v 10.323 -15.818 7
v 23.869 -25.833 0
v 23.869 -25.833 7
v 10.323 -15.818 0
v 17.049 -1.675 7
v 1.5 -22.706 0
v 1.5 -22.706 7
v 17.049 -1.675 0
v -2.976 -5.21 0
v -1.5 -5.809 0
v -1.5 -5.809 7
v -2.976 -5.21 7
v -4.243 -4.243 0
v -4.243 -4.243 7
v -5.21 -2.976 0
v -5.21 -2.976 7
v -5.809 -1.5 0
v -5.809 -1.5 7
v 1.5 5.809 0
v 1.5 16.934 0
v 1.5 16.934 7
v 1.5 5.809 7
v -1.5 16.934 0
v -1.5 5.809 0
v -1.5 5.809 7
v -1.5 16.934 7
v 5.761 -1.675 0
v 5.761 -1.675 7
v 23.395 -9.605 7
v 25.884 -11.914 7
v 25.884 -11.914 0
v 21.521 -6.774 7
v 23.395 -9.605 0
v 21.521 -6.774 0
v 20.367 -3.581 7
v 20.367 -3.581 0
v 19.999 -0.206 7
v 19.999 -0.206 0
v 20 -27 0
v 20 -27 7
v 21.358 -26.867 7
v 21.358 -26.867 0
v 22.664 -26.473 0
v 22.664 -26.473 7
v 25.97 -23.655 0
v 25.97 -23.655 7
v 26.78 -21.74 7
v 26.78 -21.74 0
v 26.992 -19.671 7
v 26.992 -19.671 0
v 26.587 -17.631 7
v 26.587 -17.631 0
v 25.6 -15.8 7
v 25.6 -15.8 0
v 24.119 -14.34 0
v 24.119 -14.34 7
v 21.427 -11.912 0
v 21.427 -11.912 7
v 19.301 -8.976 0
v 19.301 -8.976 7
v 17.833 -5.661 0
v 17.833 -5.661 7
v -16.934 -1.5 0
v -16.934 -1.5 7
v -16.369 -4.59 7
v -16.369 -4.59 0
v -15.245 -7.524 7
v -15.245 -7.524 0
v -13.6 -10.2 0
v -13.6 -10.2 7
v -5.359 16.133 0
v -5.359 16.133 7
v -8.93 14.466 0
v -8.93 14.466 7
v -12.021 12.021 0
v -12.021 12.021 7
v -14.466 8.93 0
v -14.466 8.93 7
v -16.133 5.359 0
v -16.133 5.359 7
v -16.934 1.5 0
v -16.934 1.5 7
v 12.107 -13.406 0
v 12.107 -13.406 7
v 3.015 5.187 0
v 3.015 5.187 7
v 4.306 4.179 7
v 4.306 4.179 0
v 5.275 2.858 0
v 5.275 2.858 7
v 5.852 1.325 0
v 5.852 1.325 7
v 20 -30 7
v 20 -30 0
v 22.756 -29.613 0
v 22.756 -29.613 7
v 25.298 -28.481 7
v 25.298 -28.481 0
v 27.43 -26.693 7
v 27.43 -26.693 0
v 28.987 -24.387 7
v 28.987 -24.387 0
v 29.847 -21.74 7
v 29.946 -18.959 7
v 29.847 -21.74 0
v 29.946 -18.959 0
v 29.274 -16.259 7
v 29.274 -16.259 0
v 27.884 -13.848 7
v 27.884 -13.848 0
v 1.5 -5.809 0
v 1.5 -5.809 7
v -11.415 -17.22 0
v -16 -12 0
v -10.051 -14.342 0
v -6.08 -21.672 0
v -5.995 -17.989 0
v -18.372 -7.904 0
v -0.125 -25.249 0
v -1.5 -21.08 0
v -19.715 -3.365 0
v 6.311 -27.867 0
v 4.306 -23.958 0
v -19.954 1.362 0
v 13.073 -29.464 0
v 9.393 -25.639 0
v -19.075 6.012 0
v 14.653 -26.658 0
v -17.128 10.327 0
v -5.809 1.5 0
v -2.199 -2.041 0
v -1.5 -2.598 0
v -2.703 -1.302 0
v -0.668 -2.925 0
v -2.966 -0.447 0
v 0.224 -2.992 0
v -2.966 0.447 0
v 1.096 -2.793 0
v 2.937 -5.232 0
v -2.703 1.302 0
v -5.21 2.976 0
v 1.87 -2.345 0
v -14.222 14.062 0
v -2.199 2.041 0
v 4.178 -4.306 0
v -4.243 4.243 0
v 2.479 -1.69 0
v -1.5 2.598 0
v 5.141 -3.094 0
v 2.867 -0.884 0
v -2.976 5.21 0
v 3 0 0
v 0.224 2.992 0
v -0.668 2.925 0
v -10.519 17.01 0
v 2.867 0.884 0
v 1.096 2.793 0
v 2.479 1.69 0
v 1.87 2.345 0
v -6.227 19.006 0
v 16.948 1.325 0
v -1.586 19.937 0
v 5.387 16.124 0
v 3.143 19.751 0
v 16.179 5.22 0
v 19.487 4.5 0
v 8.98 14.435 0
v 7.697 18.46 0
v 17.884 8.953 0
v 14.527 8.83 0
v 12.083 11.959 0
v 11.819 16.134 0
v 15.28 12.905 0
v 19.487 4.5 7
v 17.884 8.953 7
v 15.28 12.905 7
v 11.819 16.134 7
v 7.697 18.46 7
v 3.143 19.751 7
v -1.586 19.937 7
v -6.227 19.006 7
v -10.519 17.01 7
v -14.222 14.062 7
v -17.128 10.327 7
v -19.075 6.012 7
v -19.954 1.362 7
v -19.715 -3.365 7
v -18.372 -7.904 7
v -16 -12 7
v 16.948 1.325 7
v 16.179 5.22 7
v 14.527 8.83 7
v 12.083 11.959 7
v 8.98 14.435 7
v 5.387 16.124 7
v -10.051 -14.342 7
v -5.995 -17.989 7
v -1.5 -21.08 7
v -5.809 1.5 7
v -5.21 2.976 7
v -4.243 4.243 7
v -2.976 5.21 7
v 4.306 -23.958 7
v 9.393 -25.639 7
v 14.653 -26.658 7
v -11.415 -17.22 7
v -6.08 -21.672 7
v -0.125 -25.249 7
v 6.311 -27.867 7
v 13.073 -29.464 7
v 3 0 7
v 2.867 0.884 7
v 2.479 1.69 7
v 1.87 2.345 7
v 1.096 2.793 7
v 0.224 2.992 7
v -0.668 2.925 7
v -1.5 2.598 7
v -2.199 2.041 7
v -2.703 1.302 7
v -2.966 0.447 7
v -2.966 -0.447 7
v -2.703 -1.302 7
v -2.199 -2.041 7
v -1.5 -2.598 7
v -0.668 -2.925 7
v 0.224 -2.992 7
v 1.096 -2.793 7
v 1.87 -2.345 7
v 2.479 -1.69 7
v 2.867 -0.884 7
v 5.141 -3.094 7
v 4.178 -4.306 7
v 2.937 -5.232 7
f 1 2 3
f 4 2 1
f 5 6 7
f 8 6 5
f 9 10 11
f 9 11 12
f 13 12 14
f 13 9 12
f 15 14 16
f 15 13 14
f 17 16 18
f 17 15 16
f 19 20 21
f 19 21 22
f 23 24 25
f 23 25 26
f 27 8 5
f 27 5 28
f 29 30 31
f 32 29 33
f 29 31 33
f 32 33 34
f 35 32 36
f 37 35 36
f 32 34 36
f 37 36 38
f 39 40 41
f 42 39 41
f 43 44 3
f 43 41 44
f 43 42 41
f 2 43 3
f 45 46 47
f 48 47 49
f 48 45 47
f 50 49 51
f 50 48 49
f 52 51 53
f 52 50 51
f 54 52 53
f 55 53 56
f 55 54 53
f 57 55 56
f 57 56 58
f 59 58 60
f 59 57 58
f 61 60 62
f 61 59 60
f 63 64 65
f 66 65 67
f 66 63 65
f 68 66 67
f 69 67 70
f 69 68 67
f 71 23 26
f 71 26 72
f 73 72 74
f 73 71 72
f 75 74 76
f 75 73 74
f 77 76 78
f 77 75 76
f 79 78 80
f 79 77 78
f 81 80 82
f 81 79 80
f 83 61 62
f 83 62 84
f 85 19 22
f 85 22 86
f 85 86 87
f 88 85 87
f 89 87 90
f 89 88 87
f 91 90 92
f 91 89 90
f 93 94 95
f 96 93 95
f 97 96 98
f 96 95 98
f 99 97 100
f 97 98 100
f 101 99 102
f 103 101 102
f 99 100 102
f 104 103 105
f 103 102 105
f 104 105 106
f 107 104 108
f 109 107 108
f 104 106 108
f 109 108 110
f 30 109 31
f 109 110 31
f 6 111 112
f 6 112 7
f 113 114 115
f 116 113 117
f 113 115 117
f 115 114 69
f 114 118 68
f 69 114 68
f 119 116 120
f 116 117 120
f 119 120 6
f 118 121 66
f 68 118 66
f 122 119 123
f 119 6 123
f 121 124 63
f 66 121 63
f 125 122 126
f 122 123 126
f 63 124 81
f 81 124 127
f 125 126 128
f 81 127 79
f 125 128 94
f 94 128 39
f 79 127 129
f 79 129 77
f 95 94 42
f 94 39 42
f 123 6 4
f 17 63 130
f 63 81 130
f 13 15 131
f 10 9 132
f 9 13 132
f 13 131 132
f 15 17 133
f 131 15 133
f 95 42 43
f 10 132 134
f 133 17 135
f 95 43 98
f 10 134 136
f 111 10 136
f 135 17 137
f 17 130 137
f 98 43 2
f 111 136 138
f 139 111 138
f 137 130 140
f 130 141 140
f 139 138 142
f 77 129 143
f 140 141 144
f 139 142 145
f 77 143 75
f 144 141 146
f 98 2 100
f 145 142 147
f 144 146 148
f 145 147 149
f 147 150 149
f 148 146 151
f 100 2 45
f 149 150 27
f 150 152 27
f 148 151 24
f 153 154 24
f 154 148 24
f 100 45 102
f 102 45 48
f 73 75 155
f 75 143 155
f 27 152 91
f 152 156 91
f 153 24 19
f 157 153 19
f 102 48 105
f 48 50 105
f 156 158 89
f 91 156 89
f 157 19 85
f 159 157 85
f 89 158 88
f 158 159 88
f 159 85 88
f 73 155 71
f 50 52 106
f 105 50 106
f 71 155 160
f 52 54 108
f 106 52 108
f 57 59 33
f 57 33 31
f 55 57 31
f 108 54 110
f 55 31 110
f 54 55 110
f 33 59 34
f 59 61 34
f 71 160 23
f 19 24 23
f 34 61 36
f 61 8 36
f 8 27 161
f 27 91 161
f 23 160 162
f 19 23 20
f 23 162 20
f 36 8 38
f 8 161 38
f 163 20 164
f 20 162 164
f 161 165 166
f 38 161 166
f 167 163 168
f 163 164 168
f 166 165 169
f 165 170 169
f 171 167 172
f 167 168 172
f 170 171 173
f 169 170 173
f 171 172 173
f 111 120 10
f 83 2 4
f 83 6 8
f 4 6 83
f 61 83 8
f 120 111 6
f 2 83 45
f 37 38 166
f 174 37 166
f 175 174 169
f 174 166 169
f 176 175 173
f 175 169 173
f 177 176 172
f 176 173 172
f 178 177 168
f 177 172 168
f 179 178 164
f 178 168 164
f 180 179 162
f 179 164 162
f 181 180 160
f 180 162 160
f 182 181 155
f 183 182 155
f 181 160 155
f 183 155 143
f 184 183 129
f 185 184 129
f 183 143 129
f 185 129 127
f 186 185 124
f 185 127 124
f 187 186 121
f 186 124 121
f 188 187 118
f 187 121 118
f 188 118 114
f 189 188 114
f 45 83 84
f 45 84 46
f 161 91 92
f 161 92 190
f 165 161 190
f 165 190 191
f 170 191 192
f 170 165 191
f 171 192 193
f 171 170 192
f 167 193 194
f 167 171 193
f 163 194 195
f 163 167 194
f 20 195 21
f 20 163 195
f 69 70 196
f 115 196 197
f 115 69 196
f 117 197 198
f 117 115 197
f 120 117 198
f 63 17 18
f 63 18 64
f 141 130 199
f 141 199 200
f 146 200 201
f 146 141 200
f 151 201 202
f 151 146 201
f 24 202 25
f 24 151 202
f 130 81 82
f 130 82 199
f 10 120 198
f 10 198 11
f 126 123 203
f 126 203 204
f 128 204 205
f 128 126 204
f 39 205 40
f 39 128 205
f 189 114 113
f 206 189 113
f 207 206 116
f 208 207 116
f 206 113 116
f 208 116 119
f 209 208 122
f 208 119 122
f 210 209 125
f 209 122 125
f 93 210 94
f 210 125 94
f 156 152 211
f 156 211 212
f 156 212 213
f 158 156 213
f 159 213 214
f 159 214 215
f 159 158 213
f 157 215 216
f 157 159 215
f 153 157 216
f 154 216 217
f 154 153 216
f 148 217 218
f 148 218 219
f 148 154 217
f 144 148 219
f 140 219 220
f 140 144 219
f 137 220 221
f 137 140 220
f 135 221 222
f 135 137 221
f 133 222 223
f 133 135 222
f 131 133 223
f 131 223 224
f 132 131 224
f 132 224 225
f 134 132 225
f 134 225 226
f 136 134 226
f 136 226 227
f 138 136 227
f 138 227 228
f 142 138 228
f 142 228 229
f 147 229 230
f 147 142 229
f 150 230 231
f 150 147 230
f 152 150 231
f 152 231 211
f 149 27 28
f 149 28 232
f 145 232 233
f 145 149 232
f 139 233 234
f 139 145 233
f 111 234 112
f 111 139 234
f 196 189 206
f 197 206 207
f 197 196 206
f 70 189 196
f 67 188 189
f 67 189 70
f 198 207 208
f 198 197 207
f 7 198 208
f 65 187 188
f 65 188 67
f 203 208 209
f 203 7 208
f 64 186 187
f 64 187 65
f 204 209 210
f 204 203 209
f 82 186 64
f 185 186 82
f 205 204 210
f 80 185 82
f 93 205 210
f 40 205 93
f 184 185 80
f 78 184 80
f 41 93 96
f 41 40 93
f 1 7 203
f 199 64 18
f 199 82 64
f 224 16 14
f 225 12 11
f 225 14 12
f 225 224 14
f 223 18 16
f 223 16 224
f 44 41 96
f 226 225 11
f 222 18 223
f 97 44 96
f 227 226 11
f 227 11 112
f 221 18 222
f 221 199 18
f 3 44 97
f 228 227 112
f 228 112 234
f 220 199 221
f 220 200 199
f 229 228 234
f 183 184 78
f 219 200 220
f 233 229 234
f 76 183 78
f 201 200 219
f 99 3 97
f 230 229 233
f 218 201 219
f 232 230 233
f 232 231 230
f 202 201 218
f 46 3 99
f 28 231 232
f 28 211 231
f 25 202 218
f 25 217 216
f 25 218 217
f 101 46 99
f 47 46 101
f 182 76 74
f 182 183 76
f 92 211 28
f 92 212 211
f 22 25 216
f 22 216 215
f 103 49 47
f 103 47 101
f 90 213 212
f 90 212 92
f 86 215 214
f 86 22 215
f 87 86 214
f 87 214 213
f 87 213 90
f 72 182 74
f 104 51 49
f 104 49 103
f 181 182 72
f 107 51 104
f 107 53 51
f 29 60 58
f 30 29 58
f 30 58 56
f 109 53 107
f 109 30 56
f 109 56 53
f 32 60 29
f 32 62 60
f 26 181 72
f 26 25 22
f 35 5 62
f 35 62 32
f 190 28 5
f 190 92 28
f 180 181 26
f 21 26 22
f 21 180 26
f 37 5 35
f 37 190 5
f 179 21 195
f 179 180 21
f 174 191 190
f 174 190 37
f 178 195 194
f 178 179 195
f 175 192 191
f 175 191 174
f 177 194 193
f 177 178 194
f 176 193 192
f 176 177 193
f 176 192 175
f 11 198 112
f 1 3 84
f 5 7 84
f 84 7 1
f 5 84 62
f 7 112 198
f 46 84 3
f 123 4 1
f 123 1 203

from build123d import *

# Parameters (mm, degrees)
SKETCH1_R           = 3
BOSS_EXTRUDE2_DEPTH = 7
CUT_EXTRUDE2_DEPTH  = 10


with BuildPart() as part:
    # Sketch1 → Boss-Extrude2 (new body)
    with BuildSketch(Plane.XY):
        with BuildLine():
            ThreePointArc((19.998941051, -0.20580779), (-6.226847104, 19.005956307), (-16, -12))
            ThreePointArc((-16, -12), (-0.124611797, -25.249223595), (20, -30))
            ThreePointArc((20, -30), (29.509457722, -23.09357622), (25.883646455, -11.914042766))
            ThreePointArc((25.883646455, -11.914042766), (21.521016167, -6.773774564), (19.998941051, -0.20580779))
        make_face()
        Circle(SKETCH1_R, mode=Mode.SUBTRACT)
    extrude(amount=BOSS_EXTRUDE2_DEPTH)

    # Sketch4 → Cut-Extrude2 (cut)
    with BuildSketch(Plane.XY):
        with BuildLine():
            Line((-1.5, -21.079772727), (-1.5, -5.809475019))
            ThreePointArc((-1.5, -5.809475019), (-4.242640687, -4.242640687), (-5.809475019, -1.5))
            Line((-5.809475019, -1.5), (-16.933694222, -1.5))
            ThreePointArc((-16.933694222, -1.5), (-15.874480171, -6.082834807), (-13.6, -10.2))
            ThreePointArc((-13.6, -10.2), (-8.081931266, -16.231476692), (-1.5, -21.079772727))
        make_face()
        with BuildLine():
            ThreePointArc((-5.809475019, 1.5), (-4.242640687, 4.242640687), (-1.5, 5.809475019))
            Line((-1.5, 5.809475019), (-1.5, 16.933694222))
            ThreePointArc((-1.5, 16.933694222), (-12.02081528, 12.02081528), (-16.933694222, 1.5))
            Line((-16.933694222, 1.5), (-5.809475019, 1.5))
        make_face()
        with BuildLine():
            ThreePointArc((1.5, 5.809475019), (4.305801895, 4.178524864), (5.851855009, 1.325063379))
            Line((5.851855009, 1.325063379), (16.948280356, 1.325063379))
            ThreePointArc((16.948280356, 1.325063379), (12.082719116, 11.958591003), (1.5, 16.933694222))
            Line((1.5, 16.933694222), (1.5, 5.809475019))
        make_face()
        with BuildLine():
            Line((17.048775601, -1.674936621), (5.761474405, -1.674936621))
            ThreePointArc((5.761474405, -1.674936621), (4.178020413, -4.306291377), (1.5, -5.809475019))
            Line((1.5, -5.809475019), (1.5, -22.706100302))
            Line((1.5, -22.706100302), (17.048775601, -1.674936621))
        make_face()
        with BuildLine():
            ThreePointArc((24.118552518, -14.339829936), (20.286608679, -10.499414856), (17.832718736, -5.660922764))
            Line((17.832718736, -5.660922764), (12.106553004, -13.40609395))
            Line((12.106553004, -13.40609395), (25.969739669, -23.655435444))
            ThreePointArc((25.969739669, -23.655435444), (26.865750965, -18.635645321), (24.118552518, -14.339829936))
        make_face()
        with BuildLine():
            Line((10.323082943, -15.818402915), (4.305668643, -23.95751485))
            ThreePointArc((4.305668643, -23.95751485), (12.00674108, -26.232363646), (20, -27))
            ThreePointArc((20, -27), (22.020668793, -26.702006985), (23.869296105, -25.833399322))
            Line((23.869296105, -25.833399322), (10.323082943, -15.818402915))
        make_face()
    extrude(amount=CUT_EXTRUDE2_DEPTH, mode=Mode.SUBTRACT)


solid = part.part
